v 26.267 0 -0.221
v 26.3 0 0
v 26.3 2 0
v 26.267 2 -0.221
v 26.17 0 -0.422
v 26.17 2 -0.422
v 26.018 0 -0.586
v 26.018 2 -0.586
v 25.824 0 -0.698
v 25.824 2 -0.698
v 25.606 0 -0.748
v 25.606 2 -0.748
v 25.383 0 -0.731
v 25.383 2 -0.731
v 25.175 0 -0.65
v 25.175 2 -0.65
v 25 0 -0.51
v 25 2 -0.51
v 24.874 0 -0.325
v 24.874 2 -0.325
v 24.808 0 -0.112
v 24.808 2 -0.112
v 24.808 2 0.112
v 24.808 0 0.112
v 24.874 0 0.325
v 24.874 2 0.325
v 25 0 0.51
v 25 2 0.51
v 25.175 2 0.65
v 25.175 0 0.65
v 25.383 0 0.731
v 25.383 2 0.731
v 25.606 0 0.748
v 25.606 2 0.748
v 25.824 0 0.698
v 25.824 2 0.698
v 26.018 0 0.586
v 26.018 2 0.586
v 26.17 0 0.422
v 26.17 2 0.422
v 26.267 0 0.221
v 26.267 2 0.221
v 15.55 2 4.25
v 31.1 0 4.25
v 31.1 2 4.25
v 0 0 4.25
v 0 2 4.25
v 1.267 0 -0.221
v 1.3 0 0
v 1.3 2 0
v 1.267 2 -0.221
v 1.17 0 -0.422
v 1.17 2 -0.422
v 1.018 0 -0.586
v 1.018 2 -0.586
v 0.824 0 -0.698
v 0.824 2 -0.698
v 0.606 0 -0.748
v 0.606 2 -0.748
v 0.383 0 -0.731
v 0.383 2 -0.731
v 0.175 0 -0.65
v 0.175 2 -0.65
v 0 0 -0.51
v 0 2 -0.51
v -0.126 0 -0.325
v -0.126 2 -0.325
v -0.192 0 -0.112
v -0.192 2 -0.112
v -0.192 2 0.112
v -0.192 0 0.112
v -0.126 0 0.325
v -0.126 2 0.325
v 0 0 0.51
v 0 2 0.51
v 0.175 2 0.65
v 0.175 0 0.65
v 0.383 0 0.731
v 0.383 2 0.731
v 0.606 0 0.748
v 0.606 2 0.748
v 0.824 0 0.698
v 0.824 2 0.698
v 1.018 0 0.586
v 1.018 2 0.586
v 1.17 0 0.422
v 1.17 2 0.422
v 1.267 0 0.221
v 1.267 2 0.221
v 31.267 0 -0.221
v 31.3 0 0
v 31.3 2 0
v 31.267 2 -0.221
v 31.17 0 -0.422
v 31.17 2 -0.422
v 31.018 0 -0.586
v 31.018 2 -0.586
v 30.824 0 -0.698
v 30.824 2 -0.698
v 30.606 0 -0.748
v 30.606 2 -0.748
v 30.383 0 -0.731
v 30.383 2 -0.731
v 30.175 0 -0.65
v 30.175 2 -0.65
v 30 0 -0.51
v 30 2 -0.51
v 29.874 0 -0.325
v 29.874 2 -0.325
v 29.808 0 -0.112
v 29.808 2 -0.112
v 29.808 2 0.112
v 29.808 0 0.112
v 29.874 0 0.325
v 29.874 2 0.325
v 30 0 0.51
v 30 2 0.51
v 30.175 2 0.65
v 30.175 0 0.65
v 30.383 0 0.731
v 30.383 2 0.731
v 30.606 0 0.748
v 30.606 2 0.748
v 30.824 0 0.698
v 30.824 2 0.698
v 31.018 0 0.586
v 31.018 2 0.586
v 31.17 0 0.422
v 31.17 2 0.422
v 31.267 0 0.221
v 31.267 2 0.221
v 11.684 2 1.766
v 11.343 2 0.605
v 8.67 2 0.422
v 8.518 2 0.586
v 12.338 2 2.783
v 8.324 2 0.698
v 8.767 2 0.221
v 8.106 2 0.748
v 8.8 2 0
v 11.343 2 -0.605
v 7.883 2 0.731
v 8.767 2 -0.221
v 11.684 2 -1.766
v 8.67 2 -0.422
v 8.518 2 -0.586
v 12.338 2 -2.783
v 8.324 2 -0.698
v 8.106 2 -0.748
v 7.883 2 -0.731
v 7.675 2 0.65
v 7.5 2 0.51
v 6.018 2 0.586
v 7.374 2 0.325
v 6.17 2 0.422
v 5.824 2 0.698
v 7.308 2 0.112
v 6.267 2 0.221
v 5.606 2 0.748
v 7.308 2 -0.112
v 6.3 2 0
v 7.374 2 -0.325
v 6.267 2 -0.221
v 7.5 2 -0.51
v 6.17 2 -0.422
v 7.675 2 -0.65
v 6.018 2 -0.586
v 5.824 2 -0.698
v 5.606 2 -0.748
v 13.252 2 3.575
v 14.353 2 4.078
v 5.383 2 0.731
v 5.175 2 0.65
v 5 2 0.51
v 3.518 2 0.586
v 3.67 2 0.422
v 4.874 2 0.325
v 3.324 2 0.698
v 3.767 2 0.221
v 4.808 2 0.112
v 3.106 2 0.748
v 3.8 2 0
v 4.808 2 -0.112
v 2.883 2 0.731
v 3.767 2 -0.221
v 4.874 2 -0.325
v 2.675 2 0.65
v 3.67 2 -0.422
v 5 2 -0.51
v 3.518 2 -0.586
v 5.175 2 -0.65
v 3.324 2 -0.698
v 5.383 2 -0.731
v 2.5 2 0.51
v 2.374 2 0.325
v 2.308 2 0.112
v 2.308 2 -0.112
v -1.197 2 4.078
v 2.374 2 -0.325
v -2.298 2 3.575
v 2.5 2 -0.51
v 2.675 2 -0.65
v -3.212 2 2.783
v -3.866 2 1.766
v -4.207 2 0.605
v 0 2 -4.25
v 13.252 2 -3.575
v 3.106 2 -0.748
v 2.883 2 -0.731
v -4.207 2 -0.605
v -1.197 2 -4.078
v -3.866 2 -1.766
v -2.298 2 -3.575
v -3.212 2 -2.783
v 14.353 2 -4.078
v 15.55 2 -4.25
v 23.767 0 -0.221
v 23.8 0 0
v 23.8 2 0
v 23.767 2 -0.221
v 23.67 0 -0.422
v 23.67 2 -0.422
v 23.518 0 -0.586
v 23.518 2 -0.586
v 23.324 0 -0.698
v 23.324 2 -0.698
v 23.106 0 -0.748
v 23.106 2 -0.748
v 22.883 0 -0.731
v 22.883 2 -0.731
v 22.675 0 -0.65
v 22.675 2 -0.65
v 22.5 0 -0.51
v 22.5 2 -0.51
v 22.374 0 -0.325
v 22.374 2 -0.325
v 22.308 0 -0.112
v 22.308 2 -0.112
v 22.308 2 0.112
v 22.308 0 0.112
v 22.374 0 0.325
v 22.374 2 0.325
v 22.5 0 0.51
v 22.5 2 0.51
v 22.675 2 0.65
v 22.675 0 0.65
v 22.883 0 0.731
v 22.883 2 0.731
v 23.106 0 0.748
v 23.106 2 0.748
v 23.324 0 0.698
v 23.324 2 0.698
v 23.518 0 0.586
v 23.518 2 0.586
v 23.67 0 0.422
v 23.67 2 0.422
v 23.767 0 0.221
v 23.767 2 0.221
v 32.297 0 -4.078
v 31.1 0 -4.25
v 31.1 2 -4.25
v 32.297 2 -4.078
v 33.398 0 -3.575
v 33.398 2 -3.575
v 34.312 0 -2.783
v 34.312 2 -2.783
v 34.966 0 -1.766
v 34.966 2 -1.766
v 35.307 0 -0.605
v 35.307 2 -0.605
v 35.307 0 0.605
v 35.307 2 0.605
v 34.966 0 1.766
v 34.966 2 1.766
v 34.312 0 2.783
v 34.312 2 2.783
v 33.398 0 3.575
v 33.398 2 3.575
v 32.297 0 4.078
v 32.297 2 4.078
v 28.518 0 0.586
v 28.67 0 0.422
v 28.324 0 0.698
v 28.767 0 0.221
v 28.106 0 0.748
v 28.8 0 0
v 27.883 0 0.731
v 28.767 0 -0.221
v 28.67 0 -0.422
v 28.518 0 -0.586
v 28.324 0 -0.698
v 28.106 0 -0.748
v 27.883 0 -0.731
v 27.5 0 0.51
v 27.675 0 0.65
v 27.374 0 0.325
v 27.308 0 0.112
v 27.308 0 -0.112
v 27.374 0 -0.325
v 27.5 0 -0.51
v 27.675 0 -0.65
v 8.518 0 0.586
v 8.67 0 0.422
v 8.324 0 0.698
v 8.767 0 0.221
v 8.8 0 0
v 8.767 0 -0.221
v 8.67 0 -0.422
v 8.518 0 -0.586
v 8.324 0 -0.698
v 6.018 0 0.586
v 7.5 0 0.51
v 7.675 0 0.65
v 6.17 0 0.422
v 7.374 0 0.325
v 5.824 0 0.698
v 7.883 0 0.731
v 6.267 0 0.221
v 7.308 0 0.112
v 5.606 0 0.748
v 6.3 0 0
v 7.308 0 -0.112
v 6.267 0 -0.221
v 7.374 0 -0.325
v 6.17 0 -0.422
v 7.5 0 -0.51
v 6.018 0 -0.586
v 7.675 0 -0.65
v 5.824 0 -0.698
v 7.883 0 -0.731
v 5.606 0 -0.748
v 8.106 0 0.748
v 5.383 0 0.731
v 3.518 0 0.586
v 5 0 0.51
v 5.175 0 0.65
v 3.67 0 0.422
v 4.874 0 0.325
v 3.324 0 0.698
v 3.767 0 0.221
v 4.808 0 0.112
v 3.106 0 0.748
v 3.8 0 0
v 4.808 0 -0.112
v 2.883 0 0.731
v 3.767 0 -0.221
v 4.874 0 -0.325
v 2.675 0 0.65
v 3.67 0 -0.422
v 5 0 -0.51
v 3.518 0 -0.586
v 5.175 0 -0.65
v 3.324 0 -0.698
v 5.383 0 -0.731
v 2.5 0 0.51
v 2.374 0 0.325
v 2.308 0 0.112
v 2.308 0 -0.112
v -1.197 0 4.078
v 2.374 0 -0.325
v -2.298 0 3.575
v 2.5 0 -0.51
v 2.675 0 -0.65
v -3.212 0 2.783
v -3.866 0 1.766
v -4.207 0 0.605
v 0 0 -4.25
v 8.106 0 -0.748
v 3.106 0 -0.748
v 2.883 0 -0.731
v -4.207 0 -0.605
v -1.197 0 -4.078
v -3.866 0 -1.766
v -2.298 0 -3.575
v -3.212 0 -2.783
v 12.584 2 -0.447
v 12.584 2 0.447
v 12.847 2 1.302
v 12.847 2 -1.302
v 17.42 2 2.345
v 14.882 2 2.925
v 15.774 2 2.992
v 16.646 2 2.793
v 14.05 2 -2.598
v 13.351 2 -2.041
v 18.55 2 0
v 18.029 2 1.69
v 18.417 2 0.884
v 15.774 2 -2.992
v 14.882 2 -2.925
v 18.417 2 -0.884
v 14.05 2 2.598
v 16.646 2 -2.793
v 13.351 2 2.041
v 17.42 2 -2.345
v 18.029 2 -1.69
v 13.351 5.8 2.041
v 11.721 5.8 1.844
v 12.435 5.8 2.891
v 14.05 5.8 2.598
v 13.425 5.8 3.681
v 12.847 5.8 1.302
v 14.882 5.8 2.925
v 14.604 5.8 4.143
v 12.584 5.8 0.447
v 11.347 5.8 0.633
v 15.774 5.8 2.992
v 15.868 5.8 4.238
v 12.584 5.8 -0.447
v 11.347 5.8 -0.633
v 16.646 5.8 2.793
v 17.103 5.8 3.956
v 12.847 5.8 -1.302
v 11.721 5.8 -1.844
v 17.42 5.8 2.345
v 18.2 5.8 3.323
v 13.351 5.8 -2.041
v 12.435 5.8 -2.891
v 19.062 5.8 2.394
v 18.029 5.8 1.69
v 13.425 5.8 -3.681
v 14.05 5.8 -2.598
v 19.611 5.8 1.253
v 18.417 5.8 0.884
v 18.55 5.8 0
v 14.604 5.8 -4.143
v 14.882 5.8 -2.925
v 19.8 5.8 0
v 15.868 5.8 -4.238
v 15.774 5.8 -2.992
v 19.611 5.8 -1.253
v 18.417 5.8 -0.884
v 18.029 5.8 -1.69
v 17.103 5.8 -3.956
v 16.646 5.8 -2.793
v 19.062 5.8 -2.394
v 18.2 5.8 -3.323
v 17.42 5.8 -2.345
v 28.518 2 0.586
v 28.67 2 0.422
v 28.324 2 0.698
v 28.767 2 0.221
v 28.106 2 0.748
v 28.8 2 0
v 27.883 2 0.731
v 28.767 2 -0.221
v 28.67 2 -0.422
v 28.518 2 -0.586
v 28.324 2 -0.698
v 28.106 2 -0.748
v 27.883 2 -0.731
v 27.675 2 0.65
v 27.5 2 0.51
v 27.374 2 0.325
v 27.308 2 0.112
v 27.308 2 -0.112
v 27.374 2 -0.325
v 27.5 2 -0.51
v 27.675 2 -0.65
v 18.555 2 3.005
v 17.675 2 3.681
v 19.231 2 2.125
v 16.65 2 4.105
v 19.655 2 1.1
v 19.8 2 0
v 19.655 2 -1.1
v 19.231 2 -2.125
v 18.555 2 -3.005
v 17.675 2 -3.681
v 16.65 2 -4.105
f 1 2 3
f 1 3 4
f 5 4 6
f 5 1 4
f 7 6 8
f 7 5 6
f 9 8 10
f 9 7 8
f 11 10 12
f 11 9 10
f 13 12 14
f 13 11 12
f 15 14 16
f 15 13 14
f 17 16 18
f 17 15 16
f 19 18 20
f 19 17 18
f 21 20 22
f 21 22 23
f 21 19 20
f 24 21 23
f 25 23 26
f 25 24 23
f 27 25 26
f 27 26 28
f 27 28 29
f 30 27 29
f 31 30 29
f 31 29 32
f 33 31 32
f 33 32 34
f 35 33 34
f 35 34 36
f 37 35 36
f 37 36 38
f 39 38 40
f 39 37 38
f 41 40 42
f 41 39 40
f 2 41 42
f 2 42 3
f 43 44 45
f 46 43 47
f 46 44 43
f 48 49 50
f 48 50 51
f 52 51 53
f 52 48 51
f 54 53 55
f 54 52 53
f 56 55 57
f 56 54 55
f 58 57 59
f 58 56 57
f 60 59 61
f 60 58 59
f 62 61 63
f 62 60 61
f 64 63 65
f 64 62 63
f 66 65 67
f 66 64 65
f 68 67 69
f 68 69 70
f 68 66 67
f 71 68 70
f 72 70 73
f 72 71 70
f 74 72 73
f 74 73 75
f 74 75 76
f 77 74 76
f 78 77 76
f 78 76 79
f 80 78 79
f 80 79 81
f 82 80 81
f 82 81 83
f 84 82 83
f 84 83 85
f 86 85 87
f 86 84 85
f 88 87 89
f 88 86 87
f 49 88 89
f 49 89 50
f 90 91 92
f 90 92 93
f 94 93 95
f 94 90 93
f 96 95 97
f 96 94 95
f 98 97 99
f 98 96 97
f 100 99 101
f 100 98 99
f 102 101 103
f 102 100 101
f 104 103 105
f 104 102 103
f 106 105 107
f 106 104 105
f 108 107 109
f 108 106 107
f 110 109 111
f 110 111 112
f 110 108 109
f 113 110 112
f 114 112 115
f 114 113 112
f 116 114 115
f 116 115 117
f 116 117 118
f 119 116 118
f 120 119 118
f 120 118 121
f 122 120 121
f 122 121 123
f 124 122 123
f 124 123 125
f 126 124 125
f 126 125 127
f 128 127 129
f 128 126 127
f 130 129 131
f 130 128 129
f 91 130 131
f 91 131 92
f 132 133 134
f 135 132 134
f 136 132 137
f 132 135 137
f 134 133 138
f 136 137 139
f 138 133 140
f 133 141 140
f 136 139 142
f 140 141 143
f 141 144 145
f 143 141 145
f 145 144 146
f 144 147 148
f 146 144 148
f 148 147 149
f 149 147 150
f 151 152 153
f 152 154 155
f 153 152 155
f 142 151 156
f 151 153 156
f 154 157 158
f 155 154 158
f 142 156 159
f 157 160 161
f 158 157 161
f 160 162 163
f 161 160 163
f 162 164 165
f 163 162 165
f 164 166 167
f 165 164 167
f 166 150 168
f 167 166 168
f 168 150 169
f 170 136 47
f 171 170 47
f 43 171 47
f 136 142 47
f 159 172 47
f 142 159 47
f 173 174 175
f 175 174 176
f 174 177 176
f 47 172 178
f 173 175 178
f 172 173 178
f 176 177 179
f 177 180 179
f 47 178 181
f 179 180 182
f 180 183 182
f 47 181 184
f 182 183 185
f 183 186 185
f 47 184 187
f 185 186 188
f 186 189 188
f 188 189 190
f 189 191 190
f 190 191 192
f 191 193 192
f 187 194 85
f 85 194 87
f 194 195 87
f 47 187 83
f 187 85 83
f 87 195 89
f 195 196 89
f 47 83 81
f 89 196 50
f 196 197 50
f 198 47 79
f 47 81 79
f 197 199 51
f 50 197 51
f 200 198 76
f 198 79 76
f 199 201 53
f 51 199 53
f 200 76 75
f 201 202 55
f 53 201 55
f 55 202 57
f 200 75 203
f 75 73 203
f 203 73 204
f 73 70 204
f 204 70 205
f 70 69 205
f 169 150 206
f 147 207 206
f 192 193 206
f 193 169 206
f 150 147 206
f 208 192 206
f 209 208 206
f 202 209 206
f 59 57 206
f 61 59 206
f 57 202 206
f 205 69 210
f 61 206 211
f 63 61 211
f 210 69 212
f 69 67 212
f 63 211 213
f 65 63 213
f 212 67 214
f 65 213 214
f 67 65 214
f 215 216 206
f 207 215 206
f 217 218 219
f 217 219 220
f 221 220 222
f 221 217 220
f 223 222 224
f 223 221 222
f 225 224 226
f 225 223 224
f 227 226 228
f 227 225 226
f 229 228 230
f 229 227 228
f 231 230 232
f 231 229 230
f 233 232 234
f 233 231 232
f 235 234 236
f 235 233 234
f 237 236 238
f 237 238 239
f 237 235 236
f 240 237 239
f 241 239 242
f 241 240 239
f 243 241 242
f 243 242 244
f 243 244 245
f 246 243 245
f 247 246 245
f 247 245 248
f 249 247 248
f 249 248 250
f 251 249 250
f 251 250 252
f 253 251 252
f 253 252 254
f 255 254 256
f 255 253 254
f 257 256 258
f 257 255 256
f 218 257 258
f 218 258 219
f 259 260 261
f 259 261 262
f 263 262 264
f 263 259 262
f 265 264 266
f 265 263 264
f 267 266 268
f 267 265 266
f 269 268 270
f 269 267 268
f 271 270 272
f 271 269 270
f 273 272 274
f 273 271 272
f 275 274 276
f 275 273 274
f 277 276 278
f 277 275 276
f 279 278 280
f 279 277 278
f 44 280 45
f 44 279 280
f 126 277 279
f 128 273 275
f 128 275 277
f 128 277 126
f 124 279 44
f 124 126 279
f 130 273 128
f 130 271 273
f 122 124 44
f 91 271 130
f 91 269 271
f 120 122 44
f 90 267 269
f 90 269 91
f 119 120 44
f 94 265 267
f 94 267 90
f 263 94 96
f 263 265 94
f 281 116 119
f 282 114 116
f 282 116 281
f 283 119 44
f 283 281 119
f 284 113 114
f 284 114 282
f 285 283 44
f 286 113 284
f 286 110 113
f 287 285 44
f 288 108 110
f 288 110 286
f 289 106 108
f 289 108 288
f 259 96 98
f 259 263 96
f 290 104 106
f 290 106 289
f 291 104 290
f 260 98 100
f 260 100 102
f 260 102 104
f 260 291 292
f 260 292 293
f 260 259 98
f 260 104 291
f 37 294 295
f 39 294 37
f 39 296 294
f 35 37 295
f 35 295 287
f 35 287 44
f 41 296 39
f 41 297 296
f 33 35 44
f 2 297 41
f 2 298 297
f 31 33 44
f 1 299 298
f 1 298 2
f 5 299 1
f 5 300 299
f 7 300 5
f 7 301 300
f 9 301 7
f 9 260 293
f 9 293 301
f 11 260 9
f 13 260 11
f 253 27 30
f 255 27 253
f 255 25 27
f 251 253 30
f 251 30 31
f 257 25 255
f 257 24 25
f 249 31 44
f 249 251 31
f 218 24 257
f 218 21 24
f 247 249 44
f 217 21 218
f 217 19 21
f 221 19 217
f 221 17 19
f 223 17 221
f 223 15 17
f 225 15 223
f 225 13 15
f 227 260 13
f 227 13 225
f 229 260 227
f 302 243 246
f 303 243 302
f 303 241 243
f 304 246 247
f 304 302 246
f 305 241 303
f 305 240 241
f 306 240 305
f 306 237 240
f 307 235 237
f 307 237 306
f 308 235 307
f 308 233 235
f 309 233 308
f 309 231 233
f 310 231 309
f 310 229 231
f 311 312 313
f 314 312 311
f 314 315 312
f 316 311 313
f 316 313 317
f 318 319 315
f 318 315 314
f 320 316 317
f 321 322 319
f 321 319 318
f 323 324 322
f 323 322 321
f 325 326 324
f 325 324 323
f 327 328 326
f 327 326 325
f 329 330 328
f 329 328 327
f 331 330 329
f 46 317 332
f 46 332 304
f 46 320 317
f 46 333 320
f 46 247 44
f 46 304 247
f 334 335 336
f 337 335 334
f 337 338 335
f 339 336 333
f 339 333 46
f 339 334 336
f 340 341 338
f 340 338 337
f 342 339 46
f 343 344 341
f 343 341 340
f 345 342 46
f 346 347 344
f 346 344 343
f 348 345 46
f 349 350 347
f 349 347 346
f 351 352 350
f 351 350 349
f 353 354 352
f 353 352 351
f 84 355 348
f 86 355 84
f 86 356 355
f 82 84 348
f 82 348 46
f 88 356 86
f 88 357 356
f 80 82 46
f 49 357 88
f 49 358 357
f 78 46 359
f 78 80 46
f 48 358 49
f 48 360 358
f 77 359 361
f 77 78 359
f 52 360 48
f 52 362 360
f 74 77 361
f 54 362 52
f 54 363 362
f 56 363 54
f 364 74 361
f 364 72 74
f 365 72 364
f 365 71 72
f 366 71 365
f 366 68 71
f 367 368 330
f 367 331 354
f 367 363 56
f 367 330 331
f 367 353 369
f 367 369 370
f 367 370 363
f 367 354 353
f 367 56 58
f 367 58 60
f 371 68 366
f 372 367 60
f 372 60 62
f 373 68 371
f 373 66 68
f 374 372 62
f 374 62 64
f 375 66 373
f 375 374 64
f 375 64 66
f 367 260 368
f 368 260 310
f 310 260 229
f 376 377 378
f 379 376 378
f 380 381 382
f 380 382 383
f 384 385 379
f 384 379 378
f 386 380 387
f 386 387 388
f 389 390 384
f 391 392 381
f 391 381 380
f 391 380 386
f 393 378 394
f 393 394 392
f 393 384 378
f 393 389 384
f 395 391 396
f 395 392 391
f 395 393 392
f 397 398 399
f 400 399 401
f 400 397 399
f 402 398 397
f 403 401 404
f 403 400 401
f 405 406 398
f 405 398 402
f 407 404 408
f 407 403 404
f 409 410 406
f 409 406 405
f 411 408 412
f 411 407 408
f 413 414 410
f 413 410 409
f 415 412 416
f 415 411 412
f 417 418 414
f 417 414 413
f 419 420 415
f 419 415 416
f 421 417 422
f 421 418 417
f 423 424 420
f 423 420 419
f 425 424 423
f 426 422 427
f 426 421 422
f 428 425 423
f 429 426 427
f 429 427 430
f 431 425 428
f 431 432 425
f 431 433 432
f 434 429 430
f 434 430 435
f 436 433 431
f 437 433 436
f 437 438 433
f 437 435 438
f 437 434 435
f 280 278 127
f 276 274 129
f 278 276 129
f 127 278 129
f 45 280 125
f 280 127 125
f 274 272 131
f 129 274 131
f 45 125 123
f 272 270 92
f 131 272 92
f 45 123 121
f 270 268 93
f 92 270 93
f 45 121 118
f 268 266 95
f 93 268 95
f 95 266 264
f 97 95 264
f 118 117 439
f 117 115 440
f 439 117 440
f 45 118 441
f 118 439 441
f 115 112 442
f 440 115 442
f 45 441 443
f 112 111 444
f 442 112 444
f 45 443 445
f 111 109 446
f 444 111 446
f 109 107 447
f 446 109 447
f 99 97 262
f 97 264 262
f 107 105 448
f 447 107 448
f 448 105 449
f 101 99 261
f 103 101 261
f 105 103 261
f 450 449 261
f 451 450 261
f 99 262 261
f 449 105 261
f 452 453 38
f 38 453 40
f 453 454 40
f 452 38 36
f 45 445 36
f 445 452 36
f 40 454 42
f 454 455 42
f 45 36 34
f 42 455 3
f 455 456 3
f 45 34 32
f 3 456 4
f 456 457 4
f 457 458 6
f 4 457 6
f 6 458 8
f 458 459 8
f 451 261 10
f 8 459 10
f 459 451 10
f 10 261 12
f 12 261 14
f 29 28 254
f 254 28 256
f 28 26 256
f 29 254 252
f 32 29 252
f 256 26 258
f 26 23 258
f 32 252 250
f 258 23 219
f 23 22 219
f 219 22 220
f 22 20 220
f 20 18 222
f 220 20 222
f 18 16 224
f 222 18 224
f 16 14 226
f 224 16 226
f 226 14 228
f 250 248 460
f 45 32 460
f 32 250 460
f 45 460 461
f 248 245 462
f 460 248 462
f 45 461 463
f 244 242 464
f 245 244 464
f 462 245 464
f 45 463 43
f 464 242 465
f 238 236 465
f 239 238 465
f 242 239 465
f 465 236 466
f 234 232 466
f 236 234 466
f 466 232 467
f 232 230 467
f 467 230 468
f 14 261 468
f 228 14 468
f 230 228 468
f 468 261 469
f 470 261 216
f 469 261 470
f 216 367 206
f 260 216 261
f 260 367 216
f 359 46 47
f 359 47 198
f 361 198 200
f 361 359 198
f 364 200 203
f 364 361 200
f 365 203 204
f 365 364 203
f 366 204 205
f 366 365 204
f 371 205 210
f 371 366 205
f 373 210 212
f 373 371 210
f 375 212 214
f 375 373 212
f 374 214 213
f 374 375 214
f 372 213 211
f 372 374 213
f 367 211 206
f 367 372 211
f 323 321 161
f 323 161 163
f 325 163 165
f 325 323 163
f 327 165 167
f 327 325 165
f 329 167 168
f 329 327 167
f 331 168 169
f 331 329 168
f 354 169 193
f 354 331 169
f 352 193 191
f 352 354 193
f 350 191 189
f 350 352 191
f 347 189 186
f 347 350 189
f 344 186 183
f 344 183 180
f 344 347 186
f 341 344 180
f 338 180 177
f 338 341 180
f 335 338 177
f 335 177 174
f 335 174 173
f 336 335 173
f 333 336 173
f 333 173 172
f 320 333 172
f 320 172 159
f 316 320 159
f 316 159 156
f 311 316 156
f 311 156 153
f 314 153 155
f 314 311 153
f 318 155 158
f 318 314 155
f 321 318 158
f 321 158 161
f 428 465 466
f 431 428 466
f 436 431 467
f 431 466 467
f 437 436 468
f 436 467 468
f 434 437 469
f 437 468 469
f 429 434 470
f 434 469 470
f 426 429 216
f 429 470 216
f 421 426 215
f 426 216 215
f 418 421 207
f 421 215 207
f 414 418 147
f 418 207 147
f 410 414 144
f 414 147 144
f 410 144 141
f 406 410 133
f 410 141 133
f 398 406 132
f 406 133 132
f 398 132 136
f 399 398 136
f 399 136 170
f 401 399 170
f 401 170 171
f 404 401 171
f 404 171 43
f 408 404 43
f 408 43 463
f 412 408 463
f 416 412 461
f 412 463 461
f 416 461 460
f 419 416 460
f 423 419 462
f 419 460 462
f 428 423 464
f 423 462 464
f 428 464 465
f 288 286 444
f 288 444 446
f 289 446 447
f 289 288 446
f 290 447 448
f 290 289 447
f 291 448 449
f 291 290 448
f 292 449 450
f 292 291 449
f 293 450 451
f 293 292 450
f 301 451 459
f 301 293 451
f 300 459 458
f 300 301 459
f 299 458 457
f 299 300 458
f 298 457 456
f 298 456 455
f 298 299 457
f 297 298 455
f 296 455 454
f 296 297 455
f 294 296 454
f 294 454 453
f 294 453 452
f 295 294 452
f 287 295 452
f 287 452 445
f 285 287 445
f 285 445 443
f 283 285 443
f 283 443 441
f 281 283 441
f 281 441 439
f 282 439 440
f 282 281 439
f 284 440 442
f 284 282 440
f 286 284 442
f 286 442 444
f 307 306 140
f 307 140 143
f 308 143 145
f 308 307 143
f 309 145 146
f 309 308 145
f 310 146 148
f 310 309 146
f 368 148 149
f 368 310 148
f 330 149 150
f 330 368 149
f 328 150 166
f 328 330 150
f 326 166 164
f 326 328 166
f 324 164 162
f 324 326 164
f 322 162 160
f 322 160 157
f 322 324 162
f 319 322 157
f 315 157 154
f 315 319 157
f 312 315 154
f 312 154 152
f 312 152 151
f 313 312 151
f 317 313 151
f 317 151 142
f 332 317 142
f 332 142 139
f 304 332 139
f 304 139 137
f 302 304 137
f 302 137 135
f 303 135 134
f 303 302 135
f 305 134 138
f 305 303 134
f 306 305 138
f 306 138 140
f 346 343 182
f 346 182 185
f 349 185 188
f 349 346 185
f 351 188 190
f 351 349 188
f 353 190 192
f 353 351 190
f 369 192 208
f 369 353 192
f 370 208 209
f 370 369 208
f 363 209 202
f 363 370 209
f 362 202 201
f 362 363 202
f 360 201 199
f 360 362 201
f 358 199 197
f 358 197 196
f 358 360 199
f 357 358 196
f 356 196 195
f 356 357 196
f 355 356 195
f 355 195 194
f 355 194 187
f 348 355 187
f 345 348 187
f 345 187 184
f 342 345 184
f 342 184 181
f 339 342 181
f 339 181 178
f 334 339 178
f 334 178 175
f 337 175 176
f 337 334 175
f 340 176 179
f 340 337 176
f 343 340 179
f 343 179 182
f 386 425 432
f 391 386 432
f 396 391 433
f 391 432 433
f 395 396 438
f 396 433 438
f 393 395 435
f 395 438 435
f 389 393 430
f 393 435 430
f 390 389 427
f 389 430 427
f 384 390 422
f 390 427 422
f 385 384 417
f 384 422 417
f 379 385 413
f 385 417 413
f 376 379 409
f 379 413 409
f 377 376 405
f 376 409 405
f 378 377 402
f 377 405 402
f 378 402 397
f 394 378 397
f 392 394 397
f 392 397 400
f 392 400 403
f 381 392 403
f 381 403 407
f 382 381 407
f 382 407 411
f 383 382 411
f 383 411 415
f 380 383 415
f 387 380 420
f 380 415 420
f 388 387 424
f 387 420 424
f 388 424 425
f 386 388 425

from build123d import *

# Parameters (mm, degrees)
SKETCH_1_R          = 0.75
EXTRUDE_1_DEPTH     = 2
SKETCH_2_R          = 4.25
EXTRUDE_2_DEPTH     = 3.8
SKETCH_3_R          = 3
CUT_EXTRUDE_1_DEPTH = 3.8


with BuildPart() as part:
    # Эскиз1 → Бобышка-Вытянуть1 (new body)
    with BuildSketch(Plane(origin=(0, 0, 0), x_dir=(1, 0, 0), z_dir=(0, 1, 0))):
        with BuildLine():
            Line((0, 4.25), (31.1, 4.25))
            ThreePointArc((31.1, 4.25), (35.35, 0), (31.1, -4.25))
            Line((31.1, -4.25), (0, -4.25))
            ThreePointArc((0, -4.25), (-4.25, 0), (0, 4.25))
        make_face()
        with Locations((8.05, 0)):
            Circle(SKETCH_1_R, mode=Mode.SUBTRACT)
        with Locations((23.05, 0)):
            Circle(SKETCH_1_R, mode=Mode.SUBTRACT)
        with Locations((25.55, 0)):
            Circle(SKETCH_1_R, mode=Mode.SUBTRACT)
        with Locations((28.05, 0)):
            Circle(SKETCH_1_R, mode=Mode.SUBTRACT)
        with Locations((30.55, 0)):
            Circle(SKETCH_1_R, mode=Mode.SUBTRACT)
        with Locations((5.55, 0)):
            Circle(SKETCH_1_R, mode=Mode.SUBTRACT)
        with Locations((3.05, 0)):
            Circle(SKETCH_1_R, mode=Mode.SUBTRACT)
        with Locations((0.55, 0)):
            Circle(SKETCH_1_R, mode=Mode.SUBTRACT)
    extrude(amount=EXTRUDE_1_DEPTH)

    # Эскиз2 → Бобышка-Вытянуть2 (add)
    with BuildSketch(Plane(origin=(0, 2, 0), x_dir=(1, 0, 0), z_dir=(0, 1, 0))):
        with Locations((15.55, 0)):
            Circle(SKETCH_2_R)
    extrude(amount=EXTRUDE_2_DEPTH)

    # Эскиз3 → Вырез-Вытянуть1 (cut)
    with BuildSketch(Plane(origin=(0, 5.8, 0), x_dir=(1, 0, 0), z_dir=(0, 1, 0))):
        with Locations((15.55, 0)):
            Circle(SKETCH_3_R)
    extrude(amount=-CUT_EXTRUDE_1_DEPTH, mode=Mode.SUBTRACT)


solid = part.part
